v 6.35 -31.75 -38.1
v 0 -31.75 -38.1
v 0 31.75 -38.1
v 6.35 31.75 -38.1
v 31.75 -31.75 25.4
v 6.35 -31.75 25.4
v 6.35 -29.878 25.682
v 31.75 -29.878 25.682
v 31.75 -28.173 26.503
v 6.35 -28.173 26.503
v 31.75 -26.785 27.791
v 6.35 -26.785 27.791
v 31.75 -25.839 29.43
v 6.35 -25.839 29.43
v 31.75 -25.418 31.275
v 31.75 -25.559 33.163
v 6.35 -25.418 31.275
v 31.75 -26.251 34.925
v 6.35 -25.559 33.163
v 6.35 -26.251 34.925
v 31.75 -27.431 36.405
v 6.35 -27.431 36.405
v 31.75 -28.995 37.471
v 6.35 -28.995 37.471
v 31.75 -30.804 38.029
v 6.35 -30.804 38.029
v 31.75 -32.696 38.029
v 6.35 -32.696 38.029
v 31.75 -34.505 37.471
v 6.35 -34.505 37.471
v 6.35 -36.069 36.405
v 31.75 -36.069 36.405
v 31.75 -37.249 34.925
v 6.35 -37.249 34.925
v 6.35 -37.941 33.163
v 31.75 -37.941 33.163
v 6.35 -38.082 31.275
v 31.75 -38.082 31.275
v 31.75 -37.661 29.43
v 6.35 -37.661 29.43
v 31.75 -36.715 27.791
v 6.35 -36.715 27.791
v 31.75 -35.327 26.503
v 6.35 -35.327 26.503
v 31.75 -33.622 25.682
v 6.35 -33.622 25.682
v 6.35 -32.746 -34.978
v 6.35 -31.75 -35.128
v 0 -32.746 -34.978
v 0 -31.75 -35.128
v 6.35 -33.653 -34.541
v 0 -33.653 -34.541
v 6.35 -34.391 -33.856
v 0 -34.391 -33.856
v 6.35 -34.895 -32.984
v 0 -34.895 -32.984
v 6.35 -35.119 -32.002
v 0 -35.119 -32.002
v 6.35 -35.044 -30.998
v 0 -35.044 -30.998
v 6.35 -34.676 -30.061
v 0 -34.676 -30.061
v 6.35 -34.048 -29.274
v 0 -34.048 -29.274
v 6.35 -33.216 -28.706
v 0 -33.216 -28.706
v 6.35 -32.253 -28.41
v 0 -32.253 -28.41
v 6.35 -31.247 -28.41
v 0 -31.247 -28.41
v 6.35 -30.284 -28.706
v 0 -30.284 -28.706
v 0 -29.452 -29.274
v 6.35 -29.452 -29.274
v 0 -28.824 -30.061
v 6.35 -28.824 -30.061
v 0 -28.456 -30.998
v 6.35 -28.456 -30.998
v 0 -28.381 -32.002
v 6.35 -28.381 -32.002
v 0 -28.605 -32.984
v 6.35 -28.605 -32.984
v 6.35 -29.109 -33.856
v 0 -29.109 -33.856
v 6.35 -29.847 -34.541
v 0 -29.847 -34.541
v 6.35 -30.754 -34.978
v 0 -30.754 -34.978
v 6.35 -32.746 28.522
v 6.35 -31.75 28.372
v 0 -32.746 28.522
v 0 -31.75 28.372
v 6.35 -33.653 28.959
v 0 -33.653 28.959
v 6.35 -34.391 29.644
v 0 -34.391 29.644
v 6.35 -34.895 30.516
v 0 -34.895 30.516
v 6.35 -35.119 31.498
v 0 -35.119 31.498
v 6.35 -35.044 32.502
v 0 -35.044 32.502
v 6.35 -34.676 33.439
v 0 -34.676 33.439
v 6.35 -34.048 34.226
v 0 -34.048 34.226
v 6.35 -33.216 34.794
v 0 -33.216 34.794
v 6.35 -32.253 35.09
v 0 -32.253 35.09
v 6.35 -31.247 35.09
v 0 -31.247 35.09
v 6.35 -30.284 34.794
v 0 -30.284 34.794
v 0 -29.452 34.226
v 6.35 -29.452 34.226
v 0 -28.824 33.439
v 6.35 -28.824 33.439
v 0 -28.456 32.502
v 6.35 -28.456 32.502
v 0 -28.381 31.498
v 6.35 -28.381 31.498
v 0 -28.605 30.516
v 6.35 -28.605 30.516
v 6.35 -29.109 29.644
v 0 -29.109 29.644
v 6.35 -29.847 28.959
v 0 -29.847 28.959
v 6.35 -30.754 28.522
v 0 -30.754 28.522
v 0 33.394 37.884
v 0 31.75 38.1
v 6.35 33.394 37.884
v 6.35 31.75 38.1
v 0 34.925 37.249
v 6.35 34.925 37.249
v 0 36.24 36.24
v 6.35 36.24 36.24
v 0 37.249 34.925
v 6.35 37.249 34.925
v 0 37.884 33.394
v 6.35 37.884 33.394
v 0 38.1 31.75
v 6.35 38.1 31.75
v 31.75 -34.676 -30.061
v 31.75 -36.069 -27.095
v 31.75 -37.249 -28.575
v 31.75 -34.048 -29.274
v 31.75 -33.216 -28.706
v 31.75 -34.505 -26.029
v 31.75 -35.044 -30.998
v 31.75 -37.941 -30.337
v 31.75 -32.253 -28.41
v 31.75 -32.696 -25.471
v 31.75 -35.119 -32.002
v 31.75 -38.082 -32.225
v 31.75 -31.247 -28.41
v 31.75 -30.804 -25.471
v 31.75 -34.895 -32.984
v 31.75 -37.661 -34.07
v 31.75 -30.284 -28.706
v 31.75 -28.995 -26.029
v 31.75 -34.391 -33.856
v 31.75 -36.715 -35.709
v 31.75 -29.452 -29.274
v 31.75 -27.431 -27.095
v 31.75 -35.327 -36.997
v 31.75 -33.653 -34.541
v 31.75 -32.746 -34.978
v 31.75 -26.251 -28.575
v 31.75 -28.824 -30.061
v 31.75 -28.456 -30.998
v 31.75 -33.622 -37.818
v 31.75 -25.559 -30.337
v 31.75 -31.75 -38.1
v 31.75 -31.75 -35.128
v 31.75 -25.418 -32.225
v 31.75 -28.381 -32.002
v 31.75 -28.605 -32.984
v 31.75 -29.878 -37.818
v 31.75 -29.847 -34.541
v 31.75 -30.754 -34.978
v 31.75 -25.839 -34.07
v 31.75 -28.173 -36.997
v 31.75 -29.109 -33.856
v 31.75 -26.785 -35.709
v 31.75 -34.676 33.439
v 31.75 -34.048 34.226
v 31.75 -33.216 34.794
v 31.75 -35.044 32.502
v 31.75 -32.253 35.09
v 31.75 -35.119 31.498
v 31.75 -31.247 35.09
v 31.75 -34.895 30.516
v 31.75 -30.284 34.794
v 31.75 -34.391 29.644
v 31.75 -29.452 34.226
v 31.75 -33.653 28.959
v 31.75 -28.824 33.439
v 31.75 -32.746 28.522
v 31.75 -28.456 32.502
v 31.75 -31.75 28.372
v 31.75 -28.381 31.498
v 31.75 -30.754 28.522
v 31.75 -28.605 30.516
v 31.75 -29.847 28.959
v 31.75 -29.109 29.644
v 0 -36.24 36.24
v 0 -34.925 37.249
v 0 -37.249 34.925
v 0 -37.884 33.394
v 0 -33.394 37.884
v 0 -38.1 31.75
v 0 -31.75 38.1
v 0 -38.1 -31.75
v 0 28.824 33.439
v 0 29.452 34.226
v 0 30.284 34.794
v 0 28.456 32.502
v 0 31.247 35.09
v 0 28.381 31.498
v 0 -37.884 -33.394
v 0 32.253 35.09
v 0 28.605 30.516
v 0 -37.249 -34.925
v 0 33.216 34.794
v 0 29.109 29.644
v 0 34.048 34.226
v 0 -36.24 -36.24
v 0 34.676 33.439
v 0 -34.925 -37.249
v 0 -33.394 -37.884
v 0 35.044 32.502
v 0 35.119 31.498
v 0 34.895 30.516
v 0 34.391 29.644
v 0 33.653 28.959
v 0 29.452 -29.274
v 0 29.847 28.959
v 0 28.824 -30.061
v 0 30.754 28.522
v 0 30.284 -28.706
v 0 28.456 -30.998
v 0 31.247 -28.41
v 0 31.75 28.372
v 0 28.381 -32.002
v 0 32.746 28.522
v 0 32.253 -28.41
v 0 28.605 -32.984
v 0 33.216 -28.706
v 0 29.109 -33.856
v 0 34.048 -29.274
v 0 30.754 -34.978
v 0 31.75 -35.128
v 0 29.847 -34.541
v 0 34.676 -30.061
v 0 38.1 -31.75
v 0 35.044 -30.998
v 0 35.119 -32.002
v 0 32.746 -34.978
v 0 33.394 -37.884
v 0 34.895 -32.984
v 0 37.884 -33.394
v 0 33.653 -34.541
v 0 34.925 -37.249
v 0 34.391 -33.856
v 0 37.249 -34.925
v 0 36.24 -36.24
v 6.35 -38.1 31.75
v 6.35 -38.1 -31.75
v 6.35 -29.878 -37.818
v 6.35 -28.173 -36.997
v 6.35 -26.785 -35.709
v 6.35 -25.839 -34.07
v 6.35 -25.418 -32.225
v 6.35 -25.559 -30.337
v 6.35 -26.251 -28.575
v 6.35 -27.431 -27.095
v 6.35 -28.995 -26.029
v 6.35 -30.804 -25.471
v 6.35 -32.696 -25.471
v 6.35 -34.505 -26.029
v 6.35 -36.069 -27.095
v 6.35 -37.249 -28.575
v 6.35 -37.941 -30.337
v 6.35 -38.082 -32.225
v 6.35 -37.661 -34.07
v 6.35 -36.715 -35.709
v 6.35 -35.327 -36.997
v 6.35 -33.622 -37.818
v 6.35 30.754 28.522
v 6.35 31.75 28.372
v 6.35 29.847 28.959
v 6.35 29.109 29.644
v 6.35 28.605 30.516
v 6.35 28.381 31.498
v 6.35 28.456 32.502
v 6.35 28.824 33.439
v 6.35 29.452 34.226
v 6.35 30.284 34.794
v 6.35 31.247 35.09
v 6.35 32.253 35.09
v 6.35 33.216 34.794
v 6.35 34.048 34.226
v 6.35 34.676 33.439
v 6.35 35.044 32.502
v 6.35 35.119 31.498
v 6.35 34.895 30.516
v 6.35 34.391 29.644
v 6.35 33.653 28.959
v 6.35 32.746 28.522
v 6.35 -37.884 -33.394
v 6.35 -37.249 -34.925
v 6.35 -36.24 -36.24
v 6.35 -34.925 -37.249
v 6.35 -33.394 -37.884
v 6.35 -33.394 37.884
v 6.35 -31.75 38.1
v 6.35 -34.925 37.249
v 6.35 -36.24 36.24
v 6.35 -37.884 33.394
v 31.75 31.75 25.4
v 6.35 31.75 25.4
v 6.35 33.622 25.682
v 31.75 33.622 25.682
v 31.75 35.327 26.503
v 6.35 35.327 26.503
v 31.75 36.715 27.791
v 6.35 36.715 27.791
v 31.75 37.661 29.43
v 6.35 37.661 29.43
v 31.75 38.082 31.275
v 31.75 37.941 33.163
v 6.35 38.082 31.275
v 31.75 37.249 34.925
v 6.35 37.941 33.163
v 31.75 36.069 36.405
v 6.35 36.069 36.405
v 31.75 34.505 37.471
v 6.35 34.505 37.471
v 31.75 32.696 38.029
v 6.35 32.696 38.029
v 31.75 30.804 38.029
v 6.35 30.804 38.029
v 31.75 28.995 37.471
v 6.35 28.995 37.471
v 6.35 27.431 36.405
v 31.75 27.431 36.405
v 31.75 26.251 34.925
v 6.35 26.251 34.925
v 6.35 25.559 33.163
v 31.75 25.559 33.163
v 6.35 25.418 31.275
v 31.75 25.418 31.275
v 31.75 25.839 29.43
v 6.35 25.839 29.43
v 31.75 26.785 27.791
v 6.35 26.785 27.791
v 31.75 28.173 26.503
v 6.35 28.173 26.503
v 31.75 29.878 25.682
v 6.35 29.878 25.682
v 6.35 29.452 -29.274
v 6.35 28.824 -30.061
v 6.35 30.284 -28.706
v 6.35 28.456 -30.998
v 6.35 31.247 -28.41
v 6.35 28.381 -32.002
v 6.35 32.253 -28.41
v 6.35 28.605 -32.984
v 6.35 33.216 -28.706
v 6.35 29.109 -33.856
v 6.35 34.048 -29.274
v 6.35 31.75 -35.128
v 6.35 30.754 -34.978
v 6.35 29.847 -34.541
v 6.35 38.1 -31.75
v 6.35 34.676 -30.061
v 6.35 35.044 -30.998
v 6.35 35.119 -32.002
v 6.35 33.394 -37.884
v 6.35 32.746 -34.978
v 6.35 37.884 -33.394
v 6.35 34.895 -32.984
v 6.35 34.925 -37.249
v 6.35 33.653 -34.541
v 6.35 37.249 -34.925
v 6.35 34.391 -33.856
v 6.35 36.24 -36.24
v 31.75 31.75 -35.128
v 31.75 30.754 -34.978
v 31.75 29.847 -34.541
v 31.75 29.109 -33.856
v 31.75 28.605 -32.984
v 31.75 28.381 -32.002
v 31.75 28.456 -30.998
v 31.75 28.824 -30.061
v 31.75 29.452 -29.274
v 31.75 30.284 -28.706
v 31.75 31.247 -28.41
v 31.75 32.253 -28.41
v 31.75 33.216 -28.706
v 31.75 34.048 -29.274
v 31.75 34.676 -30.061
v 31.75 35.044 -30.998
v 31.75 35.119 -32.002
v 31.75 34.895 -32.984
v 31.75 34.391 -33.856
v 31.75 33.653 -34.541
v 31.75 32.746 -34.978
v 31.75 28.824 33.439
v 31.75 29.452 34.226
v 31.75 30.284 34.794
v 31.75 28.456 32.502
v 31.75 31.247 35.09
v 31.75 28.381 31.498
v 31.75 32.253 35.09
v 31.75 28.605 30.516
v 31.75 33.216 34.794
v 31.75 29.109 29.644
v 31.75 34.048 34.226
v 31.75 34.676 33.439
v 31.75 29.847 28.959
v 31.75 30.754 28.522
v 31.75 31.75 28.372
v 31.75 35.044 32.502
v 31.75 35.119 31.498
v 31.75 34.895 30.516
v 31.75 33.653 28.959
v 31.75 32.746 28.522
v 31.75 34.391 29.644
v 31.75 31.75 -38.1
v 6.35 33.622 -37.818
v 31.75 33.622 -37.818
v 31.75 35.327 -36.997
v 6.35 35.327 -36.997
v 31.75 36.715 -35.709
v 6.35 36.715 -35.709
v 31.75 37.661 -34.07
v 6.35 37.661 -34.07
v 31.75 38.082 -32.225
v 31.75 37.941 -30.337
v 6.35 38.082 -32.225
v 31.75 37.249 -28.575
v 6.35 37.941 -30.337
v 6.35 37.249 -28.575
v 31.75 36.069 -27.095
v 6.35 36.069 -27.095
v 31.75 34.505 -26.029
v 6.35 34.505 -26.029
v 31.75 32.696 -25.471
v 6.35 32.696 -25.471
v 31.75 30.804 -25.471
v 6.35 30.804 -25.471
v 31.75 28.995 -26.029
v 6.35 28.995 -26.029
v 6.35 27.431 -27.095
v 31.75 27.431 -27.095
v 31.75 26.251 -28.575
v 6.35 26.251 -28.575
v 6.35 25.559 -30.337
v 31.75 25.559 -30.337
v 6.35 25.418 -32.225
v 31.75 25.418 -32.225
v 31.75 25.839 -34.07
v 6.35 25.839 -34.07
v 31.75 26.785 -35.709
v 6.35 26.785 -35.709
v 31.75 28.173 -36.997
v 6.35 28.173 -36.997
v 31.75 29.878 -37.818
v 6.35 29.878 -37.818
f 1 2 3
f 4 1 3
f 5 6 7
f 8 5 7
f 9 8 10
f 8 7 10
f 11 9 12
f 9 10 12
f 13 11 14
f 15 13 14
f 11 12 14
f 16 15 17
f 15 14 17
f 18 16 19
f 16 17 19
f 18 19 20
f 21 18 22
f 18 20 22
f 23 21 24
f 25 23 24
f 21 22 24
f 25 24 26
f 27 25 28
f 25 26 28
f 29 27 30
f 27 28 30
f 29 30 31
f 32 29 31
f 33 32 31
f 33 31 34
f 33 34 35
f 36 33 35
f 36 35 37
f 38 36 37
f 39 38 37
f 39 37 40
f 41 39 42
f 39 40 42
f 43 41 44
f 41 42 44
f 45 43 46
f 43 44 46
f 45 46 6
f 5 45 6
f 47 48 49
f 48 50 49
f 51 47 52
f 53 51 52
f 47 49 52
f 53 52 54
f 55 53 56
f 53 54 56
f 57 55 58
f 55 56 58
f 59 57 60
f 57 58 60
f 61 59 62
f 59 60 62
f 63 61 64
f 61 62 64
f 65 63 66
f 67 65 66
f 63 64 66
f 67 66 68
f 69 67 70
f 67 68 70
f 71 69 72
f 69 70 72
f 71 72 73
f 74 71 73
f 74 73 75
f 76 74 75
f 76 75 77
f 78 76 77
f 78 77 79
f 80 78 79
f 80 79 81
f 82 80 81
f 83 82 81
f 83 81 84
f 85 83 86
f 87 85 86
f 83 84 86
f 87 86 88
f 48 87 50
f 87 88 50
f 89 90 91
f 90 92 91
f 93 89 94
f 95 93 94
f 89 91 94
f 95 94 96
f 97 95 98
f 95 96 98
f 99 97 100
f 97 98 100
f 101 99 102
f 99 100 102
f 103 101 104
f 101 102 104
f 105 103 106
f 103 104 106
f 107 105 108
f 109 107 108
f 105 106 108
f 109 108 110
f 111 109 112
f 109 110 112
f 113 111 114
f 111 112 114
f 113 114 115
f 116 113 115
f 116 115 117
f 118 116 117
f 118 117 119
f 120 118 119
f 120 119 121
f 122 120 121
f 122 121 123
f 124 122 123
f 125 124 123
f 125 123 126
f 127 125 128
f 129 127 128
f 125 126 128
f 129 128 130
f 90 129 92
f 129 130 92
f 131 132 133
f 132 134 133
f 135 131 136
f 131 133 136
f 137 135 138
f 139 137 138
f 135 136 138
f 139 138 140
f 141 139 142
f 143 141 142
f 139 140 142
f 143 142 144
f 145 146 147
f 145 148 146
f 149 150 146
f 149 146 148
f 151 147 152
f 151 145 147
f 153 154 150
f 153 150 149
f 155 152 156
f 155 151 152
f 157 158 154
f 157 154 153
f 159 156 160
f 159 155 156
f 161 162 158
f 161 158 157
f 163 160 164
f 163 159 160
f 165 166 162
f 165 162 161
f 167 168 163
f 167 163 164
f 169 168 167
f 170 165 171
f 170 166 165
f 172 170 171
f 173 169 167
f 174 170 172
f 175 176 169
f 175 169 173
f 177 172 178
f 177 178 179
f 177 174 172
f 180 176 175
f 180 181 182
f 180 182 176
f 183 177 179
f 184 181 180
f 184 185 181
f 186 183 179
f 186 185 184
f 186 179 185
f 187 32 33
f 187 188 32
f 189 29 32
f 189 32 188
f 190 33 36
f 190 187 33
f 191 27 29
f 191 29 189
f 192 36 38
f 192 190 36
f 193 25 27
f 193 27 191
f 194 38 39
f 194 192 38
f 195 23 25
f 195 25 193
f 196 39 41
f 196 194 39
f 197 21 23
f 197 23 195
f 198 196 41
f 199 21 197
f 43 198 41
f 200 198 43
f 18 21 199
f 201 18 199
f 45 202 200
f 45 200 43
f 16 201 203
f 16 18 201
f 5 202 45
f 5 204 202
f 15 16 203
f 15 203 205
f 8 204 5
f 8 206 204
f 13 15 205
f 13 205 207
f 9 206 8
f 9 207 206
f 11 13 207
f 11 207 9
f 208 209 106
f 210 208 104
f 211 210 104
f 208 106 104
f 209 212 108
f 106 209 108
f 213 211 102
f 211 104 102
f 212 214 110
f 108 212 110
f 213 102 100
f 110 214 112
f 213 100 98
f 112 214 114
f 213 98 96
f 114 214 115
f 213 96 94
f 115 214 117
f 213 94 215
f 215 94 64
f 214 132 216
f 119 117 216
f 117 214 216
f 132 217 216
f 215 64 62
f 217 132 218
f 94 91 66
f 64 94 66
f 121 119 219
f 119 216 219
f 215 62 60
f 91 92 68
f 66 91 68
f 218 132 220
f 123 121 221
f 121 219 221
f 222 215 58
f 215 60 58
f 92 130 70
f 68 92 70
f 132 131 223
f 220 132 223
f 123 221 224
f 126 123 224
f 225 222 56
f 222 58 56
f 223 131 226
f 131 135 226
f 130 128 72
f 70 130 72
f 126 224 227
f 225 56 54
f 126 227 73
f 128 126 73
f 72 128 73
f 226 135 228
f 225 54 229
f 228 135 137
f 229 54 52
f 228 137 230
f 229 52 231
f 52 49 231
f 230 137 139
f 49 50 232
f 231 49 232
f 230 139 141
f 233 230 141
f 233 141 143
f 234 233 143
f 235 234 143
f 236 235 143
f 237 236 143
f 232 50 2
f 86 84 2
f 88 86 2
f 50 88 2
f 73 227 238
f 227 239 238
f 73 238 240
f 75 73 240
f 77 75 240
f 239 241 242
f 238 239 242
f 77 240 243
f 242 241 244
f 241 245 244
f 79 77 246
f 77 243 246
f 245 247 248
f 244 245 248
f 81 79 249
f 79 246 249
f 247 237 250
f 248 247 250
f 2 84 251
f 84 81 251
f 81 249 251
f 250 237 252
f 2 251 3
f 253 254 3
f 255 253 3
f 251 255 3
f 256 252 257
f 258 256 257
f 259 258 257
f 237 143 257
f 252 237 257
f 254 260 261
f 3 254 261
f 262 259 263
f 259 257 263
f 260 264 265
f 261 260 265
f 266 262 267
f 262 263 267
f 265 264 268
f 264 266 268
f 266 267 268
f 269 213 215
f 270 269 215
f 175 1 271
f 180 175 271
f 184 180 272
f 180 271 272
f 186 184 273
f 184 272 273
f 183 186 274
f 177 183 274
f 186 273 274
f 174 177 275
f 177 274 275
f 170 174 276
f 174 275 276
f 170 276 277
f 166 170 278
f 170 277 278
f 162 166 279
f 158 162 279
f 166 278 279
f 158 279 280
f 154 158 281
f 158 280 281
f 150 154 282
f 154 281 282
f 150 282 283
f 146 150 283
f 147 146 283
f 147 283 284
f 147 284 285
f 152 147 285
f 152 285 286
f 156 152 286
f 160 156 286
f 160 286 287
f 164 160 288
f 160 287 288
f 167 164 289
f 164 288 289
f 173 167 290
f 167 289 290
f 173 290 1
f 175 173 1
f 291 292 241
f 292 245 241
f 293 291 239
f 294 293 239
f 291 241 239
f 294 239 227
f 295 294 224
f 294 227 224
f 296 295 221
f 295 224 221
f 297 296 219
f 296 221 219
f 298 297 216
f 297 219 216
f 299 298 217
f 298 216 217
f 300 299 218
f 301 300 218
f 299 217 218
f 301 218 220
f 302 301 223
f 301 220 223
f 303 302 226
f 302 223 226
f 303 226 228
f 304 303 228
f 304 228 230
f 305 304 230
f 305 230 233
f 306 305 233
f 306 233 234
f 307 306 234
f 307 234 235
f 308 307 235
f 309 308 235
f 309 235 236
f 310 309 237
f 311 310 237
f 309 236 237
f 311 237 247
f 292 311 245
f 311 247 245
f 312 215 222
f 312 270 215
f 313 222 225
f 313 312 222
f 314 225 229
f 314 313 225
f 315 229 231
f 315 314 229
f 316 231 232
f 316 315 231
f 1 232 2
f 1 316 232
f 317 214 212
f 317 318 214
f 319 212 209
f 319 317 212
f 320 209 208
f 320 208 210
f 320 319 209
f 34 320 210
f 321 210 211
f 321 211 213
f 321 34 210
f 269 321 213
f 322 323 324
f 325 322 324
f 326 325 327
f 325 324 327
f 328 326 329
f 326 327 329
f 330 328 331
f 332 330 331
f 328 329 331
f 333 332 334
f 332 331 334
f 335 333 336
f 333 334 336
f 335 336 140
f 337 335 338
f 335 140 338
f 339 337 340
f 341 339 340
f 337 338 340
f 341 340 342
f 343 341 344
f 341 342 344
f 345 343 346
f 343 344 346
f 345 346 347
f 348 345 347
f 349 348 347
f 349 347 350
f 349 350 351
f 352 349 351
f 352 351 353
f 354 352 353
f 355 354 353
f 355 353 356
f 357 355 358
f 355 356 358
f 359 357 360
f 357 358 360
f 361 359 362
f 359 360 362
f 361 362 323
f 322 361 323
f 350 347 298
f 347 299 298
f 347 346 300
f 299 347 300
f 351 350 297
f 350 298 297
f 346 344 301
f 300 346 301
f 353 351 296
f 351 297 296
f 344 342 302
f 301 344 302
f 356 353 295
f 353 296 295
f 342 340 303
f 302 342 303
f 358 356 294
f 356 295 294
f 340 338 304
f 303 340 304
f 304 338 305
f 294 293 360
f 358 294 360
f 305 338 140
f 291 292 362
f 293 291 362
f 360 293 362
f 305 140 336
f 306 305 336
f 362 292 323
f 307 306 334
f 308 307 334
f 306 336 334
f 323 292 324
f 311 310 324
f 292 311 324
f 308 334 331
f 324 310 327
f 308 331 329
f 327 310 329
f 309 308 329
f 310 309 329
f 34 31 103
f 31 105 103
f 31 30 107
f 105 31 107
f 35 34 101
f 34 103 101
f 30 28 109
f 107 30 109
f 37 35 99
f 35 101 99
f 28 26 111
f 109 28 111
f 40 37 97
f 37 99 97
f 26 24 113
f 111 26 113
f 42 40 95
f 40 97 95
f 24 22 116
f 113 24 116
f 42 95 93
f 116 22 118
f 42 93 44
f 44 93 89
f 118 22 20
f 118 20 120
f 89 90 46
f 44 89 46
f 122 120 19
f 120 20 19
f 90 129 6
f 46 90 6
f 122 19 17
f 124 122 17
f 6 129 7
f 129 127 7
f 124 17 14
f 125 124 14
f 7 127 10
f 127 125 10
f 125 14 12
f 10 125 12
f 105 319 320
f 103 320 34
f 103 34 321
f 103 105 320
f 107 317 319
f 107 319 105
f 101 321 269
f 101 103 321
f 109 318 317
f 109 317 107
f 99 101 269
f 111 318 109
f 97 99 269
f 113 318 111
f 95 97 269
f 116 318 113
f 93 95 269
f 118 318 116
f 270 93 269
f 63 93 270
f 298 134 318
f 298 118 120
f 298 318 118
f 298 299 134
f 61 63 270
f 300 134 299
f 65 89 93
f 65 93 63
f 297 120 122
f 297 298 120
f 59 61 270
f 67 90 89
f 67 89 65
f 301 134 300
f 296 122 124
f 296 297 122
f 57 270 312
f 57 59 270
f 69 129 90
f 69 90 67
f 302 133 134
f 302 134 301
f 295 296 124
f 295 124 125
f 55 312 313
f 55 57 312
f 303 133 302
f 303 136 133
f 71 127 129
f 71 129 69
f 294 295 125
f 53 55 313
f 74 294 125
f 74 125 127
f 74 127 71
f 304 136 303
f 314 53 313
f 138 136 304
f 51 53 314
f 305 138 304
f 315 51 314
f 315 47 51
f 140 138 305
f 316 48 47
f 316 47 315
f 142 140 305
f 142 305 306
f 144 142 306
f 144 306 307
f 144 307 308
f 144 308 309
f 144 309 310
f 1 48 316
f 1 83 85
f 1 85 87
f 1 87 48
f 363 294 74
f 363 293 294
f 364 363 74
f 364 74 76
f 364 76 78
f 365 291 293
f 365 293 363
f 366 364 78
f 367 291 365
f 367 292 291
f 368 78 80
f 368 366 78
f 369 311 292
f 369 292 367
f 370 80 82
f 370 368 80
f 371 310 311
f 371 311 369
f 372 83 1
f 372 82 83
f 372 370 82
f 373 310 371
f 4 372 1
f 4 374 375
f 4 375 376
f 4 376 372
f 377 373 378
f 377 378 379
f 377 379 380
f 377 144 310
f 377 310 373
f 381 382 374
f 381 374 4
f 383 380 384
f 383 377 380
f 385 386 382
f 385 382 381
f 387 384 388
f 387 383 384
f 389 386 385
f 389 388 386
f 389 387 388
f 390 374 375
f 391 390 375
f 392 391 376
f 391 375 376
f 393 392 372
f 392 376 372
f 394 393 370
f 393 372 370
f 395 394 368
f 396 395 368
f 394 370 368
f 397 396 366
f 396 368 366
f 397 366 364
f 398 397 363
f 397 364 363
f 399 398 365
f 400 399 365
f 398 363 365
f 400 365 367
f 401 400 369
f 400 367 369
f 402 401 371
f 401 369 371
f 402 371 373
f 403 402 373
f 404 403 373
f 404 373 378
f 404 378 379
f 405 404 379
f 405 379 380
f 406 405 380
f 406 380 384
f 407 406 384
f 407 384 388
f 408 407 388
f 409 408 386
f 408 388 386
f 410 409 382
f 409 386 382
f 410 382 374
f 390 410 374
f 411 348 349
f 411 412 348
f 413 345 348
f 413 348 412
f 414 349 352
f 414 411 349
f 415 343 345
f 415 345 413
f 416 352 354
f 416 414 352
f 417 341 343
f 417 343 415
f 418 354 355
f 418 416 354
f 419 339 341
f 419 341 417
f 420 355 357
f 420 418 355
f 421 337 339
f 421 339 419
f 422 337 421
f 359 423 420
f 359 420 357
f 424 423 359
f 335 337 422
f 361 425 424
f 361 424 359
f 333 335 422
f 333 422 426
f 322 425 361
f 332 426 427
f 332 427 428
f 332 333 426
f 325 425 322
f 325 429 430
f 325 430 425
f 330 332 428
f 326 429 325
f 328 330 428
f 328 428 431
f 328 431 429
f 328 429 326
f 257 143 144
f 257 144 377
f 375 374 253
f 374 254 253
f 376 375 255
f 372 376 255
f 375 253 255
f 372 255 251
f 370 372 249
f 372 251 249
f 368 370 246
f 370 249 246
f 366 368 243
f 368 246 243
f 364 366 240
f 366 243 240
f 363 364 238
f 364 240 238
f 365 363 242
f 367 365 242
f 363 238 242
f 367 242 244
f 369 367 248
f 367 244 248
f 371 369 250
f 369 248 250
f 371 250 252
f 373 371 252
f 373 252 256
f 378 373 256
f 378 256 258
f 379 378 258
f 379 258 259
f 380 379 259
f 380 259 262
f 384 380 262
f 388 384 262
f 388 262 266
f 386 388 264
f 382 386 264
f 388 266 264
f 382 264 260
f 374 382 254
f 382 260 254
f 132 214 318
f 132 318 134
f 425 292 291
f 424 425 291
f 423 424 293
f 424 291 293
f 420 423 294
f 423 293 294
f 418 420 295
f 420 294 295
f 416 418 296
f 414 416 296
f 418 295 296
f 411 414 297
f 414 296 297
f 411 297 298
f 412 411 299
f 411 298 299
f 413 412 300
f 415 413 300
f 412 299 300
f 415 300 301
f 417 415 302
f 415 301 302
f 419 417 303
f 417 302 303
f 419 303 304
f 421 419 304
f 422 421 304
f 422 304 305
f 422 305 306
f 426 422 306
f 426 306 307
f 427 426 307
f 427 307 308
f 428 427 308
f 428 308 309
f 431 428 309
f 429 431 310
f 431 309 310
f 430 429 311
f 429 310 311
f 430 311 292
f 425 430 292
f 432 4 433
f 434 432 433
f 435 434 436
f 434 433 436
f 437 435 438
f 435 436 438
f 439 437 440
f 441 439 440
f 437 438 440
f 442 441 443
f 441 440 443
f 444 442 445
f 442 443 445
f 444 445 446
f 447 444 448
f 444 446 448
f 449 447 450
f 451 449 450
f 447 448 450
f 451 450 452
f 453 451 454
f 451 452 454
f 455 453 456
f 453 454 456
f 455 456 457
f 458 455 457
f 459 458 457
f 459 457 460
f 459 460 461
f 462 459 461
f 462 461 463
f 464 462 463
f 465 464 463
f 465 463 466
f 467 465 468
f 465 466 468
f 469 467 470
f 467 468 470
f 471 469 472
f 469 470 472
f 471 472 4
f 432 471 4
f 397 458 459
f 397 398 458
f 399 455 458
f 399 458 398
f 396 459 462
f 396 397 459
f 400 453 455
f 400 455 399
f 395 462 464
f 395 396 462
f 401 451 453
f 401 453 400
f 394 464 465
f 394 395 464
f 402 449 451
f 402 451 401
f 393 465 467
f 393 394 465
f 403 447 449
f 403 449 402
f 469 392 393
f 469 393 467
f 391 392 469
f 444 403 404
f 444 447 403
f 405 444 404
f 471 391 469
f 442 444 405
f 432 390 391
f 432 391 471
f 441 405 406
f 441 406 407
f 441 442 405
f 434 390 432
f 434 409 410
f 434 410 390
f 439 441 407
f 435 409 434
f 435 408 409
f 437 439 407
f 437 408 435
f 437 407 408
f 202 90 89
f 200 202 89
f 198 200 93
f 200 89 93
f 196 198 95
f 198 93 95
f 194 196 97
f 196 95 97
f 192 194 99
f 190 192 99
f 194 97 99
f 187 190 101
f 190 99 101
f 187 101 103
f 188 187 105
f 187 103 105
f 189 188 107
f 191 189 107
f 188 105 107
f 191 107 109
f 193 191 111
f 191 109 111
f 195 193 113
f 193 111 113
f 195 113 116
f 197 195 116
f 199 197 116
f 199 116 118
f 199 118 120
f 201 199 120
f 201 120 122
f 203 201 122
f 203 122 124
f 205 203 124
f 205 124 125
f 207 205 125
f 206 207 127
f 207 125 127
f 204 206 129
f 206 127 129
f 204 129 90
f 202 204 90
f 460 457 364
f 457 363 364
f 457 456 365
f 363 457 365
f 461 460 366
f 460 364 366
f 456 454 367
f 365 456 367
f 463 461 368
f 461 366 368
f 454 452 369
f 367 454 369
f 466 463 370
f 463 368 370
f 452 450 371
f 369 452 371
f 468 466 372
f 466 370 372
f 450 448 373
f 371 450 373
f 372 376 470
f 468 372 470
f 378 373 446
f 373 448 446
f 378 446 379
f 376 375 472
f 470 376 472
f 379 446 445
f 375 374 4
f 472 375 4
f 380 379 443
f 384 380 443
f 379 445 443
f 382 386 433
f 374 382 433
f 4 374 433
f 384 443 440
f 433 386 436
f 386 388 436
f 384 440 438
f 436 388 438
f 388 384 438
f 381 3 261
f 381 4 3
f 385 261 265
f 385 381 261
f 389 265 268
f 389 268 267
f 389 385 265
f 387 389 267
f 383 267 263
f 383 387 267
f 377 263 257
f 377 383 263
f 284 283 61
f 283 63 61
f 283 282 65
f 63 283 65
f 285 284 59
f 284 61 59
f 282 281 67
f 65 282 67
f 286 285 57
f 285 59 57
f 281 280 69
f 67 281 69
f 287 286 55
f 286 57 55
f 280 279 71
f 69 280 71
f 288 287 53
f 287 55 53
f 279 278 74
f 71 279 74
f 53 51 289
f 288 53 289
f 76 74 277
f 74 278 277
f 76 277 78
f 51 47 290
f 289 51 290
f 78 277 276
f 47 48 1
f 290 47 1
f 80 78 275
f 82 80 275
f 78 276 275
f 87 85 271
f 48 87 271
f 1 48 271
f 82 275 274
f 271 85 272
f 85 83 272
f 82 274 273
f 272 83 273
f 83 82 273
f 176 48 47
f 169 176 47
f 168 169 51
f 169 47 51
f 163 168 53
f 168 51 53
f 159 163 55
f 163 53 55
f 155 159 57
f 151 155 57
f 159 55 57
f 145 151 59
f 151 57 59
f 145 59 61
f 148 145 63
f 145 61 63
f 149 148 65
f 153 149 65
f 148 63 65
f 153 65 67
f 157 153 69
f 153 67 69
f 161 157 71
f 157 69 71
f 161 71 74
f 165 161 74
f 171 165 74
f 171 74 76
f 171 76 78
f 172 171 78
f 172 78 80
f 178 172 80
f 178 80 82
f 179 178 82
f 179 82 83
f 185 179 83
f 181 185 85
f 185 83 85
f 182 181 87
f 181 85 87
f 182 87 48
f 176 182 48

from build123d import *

# Parameters (mm, degrees)
SKETCH1_W                         = 76.2
SKETCH1_H                         = 76.2
BOSS_EXTRUDE1_DEPTH               = 6.35
FILLET1_R                         = 6.35
SKETCH3_R                         = 6.35
BOSS_EXTRUDE2_DEPTH               = 25.4
BOSS_EXTRUDE2_2_DEPTH             = 25.4
BOSS_EXTRUDE2_3_DEPTH             = 25.4
BOSS_EXTRUDE2_4_DEPTH             = 25.4
SKETCH4_W                         = 3.3782
SKETCH4_H                         = 31.75
H_0_266_DIAMETER_HOLE1_AT_2_COUNT = 2
H_0_266_DIAMETER_HOLE1_AT_2_PITCH = 89.802561211
H_0_266_DIAMETER_HOLE1_AT_3_COUNT = 2
H_0_266_DIAMETER_HOLE1_AT_3_PITCH = 63.5
H_0_266_DIAMETER_HOLE1_AT_4_COUNT = 2
H_0_266_DIAMETER_HOLE1_AT_4_PITCH = 63.5


with BuildPart() as part:
    # Sketch1 → Boss-Extrude1 (new body)
    with BuildSketch(Plane(origin=(0, 0, 0), x_dir=(0, 0, -1), z_dir=(1, 0, 0))):
        Rectangle(SKETCH1_W, SKETCH1_H)
    extrude(amount=BOSS_EXTRUDE1_DEPTH)

    # Fillet1
    fillet1_edges = [part.edges().sort_by_distance(p)[0] for p in [
        (3.175, 38.1, 38.1),
        (3.175, 38.1, -38.1),
        (3.175, -38.1, -38.1),
        (3.175, -38.1, 38.1),
    ]]
    fillet(fillet1_edges, radius=FILLET1_R)


with BuildPart() as body_2:
    # Sketch3 → Boss-Extrude2 (new body)
    with BuildSketch(Plane(origin=(6.35, 0, 0), x_dir=(0, 0, -1), z_dir=(1, 0, 0))):
        with Locations((31.75, 31.75)):
            Circle(SKETCH3_R)
    extrude(amount=BOSS_EXTRUDE2_DEPTH)


with BuildPart() as body_3:
    # Sketch3 → Boss-Extrude2 2 (new body)
    with BuildSketch(Plane(origin=(6.35, 0, 0), x_dir=(0, 0, -1), z_dir=(1, 0, 0))):
        with Locations((31.75, -31.75)):
            Circle(SKETCH3_R)
    extrude(amount=BOSS_EXTRUDE2_2_DEPTH)


with BuildPart() as body_4:
    # Sketch3 → Boss-Extrude2 3 (new body)
    with BuildSketch(Plane(origin=(6.35, 0, 0), x_dir=(0, 0, -1), z_dir=(1, 0, 0))):
        with Locations((-31.75, -31.75)):
            Circle(SKETCH3_R)
    extrude(amount=BOSS_EXTRUDE2_3_DEPTH)


with BuildPart() as body_5:
    # Sketch3 → Boss-Extrude2 4 (new body)
    with BuildSketch(Plane(origin=(6.35, 0, 0), x_dir=(0, 0, -1), z_dir=(1, 0, 0))):
        with Locations((-31.75, 31.75)):
            Circle(SKETCH3_R)
    extrude(amount=BOSS_EXTRUDE2_4_DEPTH)


with BuildPart() as h_0_266_diameter_hole1_tool:
    # Sketch4 → H (0.266) Diameter Hole1 (revolve)
    with BuildSketch(Plane(origin=(31.75, 31.75, -31.75), x_dir=(0, 0, -1), z_dir=(0, 1, 0))):
        with Locations((1.6891, 15.875)):
            Rectangle(SKETCH4_W, SKETCH4_H)
    h_0_266_diameter_hole1 = revolve(axis=Axis((38.1, 31.75, -31.75), (-1, 0, 0)))


with BuildPart() as part_1:
    add(part.part)

    # H (0.266) Diameter Hole1: cut by h_0_266_diameter_hole1_tool
    add(h_0_266_diameter_hole1_tool.part, mode=Mode.SUBTRACT)


with BuildPart() as body_2_1:
    add(body_2.part)

    # H (0.266) Diameter Hole1: cut by h_0_266_diameter_hole1_tool
    add(h_0_266_diameter_hole1_tool.part, mode=Mode.SUBTRACT)


with BuildPart() as h_0_266_diameter_hole1_at_2_tool:
    # H (0.266) Diameter Hole1 at 2: H (0.266) Diameter Hole1 ×2
    with Locations(*[Vector(0, -0.7071067811865476, 0.7071067811865475) * (i * H_0_266_DIAMETER_HOLE1_AT_2_PITCH) for i in range(1, H_0_266_DIAMETER_HOLE1_AT_2_COUNT)]):
        add(h_0_266_diameter_hole1)


with BuildPart() as part_2:
    add(part_1.part)

    # H (0.266) Diameter Hole1 at 2: cut by h_0_266_diameter_hole1_at_2_tool
    add(h_0_266_diameter_hole1_at_2_tool.part, mode=Mode.SUBTRACT)


with BuildPart() as body_4_1:
    add(body_4.part)

    # H (0.266) Diameter Hole1 at 2: cut by h_0_266_diameter_hole1_at_2_tool
    add(h_0_266_diameter_hole1_at_2_tool.part, mode=Mode.SUBTRACT)


with BuildPart() as h_0_266_diameter_hole1_at_3_tool:
    # H (0.266) Diameter Hole1 at 3: H (0.266) Diameter Hole1 ×2
    with Locations(*[(0, 0, i * H_0_266_DIAMETER_HOLE1_AT_3_PITCH) for i in range(1, H_0_266_DIAMETER_HOLE1_AT_3_COUNT)]):
        add(h_0_266_diameter_hole1)


with BuildPart() as part_3:
    add(part_2.part)

    # H (0.266) Diameter Hole1 at 3: cut by h_0_266_diameter_hole1_at_3_tool
    add(h_0_266_diameter_hole1_at_3_tool.part, mode=Mode.SUBTRACT)


with BuildPart() as body_5_1:
    add(body_5.part)

    # H (0.266) Diameter Hole1 at 3: cut by h_0_266_diameter_hole1_at_3_tool
    add(h_0_266_diameter_hole1_at_3_tool.part, mode=Mode.SUBTRACT)


with BuildPart() as h_0_266_diameter_hole1_at_4_tool:
    # H (0.266) Diameter Hole1 at 4: H (0.266) Diameter Hole1 ×2
    with Locations(*[(0, -i * H_0_266_DIAMETER_HOLE1_AT_4_PITCH, 0) for i in range(1, H_0_266_DIAMETER_HOLE1_AT_4_COUNT)]):
        add(h_0_266_diameter_hole1)


with BuildPart() as part_4:
    add(part_3.part)

    # H (0.266) Diameter Hole1 at 4: cut by h_0_266_diameter_hole1_at_4_tool
    add(h_0_266_diameter_hole1_at_4_tool.part, mode=Mode.SUBTRACT)


with BuildPart() as body_3_1:
    add(body_3.part)

    # H (0.266) Diameter Hole1 at 4: cut by h_0_266_diameter_hole1_at_4_tool
    add(h_0_266_diameter_hole1_at_4_tool.part, mode=Mode.SUBTRACT)


solid = Compound([body_2_1.part, body_4_1.part, body_5_1.part, part_4.part, body_3_1.part])
